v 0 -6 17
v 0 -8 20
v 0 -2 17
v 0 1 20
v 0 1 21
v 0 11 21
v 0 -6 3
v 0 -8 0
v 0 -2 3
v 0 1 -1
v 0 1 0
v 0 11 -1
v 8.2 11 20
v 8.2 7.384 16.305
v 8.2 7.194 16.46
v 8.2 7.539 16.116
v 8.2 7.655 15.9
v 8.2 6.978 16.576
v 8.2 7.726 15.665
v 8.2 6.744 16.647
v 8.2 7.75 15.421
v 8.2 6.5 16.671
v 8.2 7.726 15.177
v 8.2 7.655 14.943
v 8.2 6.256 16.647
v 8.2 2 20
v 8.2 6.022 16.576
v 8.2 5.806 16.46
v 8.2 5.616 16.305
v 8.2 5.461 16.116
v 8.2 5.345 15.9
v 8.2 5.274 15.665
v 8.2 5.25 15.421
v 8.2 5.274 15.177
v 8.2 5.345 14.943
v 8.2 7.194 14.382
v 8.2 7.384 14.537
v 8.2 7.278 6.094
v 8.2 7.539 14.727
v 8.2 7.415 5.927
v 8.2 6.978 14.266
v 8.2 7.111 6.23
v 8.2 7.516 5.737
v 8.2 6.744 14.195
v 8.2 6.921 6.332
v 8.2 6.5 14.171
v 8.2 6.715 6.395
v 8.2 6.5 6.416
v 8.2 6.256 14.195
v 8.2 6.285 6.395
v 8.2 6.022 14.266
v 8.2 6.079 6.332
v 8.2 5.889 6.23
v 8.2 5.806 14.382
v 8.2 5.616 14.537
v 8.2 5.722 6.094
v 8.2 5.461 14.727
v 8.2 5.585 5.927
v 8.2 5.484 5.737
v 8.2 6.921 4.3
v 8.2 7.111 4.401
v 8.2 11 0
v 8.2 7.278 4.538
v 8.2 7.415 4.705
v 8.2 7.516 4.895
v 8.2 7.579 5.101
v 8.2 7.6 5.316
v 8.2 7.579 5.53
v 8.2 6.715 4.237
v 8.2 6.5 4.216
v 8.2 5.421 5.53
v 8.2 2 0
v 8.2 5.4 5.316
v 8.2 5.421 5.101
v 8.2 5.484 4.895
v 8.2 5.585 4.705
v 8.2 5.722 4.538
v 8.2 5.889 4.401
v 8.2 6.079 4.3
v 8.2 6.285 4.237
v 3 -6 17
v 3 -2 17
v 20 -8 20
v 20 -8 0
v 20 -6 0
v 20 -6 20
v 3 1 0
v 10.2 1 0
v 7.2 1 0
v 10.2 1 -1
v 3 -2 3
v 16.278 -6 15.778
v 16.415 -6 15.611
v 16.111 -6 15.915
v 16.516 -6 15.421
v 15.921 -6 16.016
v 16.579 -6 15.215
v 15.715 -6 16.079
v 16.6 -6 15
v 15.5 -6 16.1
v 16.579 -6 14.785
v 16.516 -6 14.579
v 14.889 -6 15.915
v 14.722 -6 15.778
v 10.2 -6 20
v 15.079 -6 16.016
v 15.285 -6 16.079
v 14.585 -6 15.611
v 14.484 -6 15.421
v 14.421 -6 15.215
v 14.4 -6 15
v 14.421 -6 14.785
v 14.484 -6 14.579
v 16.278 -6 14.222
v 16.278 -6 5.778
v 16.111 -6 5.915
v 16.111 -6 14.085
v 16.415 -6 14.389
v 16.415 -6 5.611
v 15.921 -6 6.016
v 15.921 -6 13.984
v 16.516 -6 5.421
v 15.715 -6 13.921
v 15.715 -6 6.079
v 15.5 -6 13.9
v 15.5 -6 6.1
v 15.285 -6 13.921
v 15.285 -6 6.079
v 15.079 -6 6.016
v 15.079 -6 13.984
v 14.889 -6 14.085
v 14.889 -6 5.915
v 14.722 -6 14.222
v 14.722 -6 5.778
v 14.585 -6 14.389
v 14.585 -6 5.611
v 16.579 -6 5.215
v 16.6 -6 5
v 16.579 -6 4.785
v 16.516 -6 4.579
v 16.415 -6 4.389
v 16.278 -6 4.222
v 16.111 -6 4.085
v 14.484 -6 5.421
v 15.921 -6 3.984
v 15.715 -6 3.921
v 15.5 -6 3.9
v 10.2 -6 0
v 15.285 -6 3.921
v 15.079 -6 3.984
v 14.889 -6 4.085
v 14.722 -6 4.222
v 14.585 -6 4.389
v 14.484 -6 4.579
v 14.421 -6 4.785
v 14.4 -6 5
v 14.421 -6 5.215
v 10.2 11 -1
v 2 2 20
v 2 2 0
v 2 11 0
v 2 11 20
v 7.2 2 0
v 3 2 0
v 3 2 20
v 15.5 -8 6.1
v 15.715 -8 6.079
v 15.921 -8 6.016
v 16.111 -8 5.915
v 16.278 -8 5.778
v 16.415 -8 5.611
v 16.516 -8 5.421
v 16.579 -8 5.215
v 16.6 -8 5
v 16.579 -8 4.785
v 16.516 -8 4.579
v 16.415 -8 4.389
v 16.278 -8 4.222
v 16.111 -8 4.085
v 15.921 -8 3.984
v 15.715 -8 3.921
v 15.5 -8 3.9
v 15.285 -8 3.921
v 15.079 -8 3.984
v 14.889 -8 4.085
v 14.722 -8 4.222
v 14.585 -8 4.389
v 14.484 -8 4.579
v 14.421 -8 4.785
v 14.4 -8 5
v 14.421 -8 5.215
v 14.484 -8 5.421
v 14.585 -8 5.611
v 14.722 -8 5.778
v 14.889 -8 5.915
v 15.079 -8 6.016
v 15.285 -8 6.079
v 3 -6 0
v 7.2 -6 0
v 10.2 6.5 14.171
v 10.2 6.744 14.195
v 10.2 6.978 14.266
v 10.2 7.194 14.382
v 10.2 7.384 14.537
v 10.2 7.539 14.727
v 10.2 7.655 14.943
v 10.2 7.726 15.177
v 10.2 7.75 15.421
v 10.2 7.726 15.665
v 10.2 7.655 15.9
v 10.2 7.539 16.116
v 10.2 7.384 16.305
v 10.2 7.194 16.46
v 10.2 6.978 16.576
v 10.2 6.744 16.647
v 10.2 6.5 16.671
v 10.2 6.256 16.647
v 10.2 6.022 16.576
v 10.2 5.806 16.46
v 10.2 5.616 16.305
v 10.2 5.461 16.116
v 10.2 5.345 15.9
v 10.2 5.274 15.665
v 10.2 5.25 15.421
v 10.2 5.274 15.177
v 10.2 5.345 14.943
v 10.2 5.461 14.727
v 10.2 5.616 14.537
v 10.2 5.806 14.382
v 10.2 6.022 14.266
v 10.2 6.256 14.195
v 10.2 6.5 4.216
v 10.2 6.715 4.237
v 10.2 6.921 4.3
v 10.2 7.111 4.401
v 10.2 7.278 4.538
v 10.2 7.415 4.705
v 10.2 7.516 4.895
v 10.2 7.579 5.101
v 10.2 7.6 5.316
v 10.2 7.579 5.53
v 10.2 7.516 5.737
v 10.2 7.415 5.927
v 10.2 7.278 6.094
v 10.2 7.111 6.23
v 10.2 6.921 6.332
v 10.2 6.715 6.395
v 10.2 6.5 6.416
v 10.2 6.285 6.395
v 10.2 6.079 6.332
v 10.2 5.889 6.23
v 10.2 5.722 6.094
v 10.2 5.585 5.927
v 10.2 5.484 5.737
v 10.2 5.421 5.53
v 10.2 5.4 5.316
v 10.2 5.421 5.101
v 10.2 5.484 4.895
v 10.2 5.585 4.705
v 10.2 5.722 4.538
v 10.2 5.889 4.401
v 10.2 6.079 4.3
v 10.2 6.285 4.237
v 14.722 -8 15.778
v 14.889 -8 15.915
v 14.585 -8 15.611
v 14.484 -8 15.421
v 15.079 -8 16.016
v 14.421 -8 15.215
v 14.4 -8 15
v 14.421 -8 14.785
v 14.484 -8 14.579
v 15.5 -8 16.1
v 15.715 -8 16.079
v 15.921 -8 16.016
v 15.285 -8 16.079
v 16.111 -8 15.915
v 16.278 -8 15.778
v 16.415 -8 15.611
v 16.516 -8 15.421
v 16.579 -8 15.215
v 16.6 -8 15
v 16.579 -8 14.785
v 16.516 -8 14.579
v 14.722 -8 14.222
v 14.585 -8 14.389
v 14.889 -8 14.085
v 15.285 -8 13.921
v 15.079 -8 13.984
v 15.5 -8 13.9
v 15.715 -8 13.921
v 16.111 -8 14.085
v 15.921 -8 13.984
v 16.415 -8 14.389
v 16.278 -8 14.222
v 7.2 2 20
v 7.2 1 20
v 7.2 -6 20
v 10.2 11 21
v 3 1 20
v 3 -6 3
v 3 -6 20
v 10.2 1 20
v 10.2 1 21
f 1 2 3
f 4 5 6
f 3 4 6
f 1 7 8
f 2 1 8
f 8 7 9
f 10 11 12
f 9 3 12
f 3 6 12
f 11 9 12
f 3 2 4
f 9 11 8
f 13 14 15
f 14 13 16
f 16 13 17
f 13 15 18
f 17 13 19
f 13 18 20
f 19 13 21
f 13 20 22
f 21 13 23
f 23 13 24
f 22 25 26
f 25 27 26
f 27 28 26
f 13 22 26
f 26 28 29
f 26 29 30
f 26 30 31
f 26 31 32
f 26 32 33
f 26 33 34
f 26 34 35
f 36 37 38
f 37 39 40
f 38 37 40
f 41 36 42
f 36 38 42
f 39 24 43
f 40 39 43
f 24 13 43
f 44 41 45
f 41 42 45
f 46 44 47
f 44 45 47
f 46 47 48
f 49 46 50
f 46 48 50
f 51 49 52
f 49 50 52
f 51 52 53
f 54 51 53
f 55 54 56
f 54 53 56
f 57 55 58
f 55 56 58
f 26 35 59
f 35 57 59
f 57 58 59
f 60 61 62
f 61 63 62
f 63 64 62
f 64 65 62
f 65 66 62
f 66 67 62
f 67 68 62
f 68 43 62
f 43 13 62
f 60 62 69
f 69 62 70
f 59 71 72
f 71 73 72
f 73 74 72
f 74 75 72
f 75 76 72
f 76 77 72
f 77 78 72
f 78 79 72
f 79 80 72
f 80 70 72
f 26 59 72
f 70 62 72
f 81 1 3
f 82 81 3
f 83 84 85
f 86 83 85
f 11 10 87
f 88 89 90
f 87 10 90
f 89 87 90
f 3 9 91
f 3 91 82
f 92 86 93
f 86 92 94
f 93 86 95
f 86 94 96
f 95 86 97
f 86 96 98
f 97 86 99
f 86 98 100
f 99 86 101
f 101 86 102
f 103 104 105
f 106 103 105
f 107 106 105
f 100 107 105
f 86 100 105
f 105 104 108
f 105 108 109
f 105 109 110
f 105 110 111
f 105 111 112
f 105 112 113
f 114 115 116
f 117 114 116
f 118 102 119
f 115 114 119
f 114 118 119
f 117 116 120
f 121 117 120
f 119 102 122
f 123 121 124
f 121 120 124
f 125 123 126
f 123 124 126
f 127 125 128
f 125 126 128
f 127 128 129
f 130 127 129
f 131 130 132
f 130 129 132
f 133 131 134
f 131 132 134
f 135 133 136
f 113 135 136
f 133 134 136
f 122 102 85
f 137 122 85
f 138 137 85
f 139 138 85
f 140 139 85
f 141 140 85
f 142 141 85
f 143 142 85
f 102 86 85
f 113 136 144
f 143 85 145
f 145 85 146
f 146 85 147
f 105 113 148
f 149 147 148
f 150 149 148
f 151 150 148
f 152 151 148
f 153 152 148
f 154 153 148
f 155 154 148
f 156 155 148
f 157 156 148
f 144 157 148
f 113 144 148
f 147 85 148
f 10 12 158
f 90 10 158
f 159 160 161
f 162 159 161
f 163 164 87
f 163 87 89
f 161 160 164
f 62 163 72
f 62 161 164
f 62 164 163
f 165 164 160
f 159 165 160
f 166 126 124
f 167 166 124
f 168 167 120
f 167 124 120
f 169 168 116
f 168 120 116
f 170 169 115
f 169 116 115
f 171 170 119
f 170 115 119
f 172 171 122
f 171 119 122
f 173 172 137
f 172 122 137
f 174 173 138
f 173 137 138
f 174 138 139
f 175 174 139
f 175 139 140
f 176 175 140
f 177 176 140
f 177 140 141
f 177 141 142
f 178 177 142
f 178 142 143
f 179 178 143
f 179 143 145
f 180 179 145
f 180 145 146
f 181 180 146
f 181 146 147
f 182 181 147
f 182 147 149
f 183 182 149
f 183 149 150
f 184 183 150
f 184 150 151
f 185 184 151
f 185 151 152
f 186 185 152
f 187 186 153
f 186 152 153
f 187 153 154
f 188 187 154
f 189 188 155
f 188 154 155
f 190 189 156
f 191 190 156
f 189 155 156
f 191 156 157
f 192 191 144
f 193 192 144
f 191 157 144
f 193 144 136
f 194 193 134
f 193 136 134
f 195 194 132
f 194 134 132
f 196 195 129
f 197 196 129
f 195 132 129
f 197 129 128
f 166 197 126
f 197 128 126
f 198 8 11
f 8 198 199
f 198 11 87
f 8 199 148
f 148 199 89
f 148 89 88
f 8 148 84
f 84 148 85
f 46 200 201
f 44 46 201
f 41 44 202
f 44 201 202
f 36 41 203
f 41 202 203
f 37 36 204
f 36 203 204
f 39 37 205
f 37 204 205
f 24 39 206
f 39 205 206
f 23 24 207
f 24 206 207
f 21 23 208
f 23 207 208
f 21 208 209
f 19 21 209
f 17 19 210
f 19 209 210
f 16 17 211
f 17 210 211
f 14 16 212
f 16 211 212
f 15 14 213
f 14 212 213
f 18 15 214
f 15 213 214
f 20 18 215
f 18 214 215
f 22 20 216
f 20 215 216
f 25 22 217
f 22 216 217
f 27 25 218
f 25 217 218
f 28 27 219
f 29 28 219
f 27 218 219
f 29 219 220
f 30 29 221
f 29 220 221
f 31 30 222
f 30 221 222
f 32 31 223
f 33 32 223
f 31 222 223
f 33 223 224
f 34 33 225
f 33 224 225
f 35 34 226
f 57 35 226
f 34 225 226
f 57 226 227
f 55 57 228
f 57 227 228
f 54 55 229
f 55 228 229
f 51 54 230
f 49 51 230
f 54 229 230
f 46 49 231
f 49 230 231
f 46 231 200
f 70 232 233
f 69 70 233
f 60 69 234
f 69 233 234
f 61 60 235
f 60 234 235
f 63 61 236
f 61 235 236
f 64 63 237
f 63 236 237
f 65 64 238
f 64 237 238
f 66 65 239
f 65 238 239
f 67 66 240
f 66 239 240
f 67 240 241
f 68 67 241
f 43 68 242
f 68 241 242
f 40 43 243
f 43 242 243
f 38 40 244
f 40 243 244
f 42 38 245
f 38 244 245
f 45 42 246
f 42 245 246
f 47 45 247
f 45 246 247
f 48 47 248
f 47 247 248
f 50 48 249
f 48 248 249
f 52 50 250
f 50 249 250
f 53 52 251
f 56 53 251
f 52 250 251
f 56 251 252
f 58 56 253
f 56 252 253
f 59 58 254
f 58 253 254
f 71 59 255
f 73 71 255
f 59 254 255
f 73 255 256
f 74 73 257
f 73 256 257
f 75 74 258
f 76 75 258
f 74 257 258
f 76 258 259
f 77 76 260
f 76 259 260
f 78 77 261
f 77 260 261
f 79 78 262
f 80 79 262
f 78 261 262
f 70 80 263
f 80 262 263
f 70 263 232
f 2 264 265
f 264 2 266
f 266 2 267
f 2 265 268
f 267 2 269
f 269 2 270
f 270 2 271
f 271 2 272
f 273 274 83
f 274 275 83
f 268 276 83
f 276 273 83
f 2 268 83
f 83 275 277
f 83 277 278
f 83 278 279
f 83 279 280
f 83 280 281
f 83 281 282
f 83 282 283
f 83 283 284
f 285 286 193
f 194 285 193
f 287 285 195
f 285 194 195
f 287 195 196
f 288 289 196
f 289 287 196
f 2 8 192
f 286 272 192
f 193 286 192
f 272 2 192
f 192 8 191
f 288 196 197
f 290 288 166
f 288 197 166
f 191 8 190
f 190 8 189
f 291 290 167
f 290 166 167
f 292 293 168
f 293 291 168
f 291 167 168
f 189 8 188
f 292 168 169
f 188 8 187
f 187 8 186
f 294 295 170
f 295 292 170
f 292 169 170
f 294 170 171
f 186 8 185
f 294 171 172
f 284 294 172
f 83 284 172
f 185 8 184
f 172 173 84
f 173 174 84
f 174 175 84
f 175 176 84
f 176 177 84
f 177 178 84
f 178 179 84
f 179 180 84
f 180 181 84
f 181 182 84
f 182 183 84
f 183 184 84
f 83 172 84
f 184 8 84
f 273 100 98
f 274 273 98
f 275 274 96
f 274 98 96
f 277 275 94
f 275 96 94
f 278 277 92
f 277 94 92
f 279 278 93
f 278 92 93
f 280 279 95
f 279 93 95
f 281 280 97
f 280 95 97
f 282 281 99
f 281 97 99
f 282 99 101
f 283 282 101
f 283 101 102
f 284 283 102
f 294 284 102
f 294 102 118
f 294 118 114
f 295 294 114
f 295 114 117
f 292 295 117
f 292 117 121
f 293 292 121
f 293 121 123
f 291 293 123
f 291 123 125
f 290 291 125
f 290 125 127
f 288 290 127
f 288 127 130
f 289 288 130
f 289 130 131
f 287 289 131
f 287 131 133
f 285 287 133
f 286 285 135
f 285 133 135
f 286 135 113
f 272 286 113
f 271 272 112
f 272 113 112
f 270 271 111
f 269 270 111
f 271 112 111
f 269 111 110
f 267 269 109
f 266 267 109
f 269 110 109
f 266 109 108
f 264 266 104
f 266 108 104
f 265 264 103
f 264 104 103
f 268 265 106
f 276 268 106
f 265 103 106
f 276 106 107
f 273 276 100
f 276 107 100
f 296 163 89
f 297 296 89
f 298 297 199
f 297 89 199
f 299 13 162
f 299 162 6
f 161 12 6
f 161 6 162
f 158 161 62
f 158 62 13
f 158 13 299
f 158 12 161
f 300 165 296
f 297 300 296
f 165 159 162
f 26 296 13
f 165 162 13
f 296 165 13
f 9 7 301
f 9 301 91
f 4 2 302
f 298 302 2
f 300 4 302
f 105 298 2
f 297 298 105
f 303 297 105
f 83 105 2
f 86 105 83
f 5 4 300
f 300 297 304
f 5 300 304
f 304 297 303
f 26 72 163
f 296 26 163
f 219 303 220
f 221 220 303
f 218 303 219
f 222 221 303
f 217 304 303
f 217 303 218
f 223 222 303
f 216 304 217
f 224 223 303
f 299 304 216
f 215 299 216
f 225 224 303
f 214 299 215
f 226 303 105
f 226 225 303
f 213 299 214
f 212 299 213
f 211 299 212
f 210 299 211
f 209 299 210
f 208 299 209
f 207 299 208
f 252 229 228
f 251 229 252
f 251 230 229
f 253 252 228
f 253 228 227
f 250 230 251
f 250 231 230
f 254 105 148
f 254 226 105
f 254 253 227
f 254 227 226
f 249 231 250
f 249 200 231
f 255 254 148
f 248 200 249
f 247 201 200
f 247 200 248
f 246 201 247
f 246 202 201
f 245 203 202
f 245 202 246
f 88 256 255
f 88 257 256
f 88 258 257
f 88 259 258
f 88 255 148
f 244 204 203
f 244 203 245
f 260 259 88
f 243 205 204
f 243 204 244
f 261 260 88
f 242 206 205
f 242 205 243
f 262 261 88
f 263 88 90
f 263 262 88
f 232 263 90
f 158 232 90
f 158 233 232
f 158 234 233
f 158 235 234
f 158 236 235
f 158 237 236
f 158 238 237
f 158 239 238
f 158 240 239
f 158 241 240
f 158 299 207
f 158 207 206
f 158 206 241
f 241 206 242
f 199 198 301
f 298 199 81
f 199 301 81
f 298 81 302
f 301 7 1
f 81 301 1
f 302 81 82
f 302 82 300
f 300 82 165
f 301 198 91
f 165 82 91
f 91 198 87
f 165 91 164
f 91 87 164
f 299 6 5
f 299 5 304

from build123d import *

# Parameters (mm, degrees)
BOSS_EXTRUDE1_DEPTH  = 20
SKETCH2_W            = 14
SKETCH2_H            = 4
CUT_EXTRUDE1_DEPTH   = 3
SKETCH4_R            = 1.1
CUT_EXTRUDE2_DEPTH   = 20
SKETCH3_R            = 1.25
SKETCH3_R_2          = 1.1
CUT_EXTRUDE3_DEPTH   = 2
SKETCH9_W            = 10.2
SKETCH9_H            = 1
BOSS_EXTRUDE11_DEPTH = 10


with BuildPart() as part:
    # Sketch1 → Boss-Extrude1 (new body)
    with BuildSketch(Plane.XY):
        Polygon((0, 11), (0, -8), (20, -8), (20, -6), (10.2, -6), (10.2, 11), (8.2, 11), (8.2, 2), (7.2, 2), (7.2, -6), (3, -6), (3, 2), (2, 2), (2, 11), align=None)
    extrude(amount=BOSS_EXTRUDE1_DEPTH)

    # Sketch2 → Cut-Extrude1 (cut)
    with BuildSketch(Plane.ZY):
        with Locations((10, -4)):
            Rectangle(SKETCH2_W, SKETCH2_H)
    extrude(amount=-CUT_EXTRUDE1_DEPTH, mode=Mode.SUBTRACT)

    # Sketch4 → Cut-Extrude2 (cut)
    with BuildSketch(Plane(origin=(0, -6, 0), x_dir=(1, 0, 0), z_dir=(0, 1, 0))):
        with Locations(Location((15.5, -5, 0), (0, 0, 270))):
            Circle(SKETCH4_R)
        with Locations(Location((15.5, -15, 0), (0, 0, 270))):
            Circle(SKETCH4_R)
    extrude(amount=-CUT_EXTRUDE2_DEPTH, mode=Mode.SUBTRACT)

    # Sketch3 → Cut-Extrude3 (cut)
    with BuildSketch(Plane(origin=(10.2, 0, 0), x_dir=(0, 0, -1), z_dir=(1, 0, 0))):
        with Locations((-15.421154519, 6.5)):
            Circle(SKETCH3_R)
        with Locations((-5.315777108, 6.5)):
            Circle(SKETCH3_R_2)
    extrude(amount=-CUT_EXTRUDE3_DEPTH, mode=Mode.SUBTRACT)

    # Sketch9 → Boss-Extrude11 (add)
    with BuildSketch(Plane(origin=(0, 11, 0), x_dir=(1, 0, 0), z_dir=(0, 1, 0))):
        with Locations((5.1, 0.5)):
            Rectangle(SKETCH9_W, SKETCH9_H)
        with Locations((5.1, -20.5)):
            Rectangle(SKETCH9_W, SKETCH9_H)
    extrude(amount=-BOSS_EXTRUDE11_DEPTH)


solid = part.part
